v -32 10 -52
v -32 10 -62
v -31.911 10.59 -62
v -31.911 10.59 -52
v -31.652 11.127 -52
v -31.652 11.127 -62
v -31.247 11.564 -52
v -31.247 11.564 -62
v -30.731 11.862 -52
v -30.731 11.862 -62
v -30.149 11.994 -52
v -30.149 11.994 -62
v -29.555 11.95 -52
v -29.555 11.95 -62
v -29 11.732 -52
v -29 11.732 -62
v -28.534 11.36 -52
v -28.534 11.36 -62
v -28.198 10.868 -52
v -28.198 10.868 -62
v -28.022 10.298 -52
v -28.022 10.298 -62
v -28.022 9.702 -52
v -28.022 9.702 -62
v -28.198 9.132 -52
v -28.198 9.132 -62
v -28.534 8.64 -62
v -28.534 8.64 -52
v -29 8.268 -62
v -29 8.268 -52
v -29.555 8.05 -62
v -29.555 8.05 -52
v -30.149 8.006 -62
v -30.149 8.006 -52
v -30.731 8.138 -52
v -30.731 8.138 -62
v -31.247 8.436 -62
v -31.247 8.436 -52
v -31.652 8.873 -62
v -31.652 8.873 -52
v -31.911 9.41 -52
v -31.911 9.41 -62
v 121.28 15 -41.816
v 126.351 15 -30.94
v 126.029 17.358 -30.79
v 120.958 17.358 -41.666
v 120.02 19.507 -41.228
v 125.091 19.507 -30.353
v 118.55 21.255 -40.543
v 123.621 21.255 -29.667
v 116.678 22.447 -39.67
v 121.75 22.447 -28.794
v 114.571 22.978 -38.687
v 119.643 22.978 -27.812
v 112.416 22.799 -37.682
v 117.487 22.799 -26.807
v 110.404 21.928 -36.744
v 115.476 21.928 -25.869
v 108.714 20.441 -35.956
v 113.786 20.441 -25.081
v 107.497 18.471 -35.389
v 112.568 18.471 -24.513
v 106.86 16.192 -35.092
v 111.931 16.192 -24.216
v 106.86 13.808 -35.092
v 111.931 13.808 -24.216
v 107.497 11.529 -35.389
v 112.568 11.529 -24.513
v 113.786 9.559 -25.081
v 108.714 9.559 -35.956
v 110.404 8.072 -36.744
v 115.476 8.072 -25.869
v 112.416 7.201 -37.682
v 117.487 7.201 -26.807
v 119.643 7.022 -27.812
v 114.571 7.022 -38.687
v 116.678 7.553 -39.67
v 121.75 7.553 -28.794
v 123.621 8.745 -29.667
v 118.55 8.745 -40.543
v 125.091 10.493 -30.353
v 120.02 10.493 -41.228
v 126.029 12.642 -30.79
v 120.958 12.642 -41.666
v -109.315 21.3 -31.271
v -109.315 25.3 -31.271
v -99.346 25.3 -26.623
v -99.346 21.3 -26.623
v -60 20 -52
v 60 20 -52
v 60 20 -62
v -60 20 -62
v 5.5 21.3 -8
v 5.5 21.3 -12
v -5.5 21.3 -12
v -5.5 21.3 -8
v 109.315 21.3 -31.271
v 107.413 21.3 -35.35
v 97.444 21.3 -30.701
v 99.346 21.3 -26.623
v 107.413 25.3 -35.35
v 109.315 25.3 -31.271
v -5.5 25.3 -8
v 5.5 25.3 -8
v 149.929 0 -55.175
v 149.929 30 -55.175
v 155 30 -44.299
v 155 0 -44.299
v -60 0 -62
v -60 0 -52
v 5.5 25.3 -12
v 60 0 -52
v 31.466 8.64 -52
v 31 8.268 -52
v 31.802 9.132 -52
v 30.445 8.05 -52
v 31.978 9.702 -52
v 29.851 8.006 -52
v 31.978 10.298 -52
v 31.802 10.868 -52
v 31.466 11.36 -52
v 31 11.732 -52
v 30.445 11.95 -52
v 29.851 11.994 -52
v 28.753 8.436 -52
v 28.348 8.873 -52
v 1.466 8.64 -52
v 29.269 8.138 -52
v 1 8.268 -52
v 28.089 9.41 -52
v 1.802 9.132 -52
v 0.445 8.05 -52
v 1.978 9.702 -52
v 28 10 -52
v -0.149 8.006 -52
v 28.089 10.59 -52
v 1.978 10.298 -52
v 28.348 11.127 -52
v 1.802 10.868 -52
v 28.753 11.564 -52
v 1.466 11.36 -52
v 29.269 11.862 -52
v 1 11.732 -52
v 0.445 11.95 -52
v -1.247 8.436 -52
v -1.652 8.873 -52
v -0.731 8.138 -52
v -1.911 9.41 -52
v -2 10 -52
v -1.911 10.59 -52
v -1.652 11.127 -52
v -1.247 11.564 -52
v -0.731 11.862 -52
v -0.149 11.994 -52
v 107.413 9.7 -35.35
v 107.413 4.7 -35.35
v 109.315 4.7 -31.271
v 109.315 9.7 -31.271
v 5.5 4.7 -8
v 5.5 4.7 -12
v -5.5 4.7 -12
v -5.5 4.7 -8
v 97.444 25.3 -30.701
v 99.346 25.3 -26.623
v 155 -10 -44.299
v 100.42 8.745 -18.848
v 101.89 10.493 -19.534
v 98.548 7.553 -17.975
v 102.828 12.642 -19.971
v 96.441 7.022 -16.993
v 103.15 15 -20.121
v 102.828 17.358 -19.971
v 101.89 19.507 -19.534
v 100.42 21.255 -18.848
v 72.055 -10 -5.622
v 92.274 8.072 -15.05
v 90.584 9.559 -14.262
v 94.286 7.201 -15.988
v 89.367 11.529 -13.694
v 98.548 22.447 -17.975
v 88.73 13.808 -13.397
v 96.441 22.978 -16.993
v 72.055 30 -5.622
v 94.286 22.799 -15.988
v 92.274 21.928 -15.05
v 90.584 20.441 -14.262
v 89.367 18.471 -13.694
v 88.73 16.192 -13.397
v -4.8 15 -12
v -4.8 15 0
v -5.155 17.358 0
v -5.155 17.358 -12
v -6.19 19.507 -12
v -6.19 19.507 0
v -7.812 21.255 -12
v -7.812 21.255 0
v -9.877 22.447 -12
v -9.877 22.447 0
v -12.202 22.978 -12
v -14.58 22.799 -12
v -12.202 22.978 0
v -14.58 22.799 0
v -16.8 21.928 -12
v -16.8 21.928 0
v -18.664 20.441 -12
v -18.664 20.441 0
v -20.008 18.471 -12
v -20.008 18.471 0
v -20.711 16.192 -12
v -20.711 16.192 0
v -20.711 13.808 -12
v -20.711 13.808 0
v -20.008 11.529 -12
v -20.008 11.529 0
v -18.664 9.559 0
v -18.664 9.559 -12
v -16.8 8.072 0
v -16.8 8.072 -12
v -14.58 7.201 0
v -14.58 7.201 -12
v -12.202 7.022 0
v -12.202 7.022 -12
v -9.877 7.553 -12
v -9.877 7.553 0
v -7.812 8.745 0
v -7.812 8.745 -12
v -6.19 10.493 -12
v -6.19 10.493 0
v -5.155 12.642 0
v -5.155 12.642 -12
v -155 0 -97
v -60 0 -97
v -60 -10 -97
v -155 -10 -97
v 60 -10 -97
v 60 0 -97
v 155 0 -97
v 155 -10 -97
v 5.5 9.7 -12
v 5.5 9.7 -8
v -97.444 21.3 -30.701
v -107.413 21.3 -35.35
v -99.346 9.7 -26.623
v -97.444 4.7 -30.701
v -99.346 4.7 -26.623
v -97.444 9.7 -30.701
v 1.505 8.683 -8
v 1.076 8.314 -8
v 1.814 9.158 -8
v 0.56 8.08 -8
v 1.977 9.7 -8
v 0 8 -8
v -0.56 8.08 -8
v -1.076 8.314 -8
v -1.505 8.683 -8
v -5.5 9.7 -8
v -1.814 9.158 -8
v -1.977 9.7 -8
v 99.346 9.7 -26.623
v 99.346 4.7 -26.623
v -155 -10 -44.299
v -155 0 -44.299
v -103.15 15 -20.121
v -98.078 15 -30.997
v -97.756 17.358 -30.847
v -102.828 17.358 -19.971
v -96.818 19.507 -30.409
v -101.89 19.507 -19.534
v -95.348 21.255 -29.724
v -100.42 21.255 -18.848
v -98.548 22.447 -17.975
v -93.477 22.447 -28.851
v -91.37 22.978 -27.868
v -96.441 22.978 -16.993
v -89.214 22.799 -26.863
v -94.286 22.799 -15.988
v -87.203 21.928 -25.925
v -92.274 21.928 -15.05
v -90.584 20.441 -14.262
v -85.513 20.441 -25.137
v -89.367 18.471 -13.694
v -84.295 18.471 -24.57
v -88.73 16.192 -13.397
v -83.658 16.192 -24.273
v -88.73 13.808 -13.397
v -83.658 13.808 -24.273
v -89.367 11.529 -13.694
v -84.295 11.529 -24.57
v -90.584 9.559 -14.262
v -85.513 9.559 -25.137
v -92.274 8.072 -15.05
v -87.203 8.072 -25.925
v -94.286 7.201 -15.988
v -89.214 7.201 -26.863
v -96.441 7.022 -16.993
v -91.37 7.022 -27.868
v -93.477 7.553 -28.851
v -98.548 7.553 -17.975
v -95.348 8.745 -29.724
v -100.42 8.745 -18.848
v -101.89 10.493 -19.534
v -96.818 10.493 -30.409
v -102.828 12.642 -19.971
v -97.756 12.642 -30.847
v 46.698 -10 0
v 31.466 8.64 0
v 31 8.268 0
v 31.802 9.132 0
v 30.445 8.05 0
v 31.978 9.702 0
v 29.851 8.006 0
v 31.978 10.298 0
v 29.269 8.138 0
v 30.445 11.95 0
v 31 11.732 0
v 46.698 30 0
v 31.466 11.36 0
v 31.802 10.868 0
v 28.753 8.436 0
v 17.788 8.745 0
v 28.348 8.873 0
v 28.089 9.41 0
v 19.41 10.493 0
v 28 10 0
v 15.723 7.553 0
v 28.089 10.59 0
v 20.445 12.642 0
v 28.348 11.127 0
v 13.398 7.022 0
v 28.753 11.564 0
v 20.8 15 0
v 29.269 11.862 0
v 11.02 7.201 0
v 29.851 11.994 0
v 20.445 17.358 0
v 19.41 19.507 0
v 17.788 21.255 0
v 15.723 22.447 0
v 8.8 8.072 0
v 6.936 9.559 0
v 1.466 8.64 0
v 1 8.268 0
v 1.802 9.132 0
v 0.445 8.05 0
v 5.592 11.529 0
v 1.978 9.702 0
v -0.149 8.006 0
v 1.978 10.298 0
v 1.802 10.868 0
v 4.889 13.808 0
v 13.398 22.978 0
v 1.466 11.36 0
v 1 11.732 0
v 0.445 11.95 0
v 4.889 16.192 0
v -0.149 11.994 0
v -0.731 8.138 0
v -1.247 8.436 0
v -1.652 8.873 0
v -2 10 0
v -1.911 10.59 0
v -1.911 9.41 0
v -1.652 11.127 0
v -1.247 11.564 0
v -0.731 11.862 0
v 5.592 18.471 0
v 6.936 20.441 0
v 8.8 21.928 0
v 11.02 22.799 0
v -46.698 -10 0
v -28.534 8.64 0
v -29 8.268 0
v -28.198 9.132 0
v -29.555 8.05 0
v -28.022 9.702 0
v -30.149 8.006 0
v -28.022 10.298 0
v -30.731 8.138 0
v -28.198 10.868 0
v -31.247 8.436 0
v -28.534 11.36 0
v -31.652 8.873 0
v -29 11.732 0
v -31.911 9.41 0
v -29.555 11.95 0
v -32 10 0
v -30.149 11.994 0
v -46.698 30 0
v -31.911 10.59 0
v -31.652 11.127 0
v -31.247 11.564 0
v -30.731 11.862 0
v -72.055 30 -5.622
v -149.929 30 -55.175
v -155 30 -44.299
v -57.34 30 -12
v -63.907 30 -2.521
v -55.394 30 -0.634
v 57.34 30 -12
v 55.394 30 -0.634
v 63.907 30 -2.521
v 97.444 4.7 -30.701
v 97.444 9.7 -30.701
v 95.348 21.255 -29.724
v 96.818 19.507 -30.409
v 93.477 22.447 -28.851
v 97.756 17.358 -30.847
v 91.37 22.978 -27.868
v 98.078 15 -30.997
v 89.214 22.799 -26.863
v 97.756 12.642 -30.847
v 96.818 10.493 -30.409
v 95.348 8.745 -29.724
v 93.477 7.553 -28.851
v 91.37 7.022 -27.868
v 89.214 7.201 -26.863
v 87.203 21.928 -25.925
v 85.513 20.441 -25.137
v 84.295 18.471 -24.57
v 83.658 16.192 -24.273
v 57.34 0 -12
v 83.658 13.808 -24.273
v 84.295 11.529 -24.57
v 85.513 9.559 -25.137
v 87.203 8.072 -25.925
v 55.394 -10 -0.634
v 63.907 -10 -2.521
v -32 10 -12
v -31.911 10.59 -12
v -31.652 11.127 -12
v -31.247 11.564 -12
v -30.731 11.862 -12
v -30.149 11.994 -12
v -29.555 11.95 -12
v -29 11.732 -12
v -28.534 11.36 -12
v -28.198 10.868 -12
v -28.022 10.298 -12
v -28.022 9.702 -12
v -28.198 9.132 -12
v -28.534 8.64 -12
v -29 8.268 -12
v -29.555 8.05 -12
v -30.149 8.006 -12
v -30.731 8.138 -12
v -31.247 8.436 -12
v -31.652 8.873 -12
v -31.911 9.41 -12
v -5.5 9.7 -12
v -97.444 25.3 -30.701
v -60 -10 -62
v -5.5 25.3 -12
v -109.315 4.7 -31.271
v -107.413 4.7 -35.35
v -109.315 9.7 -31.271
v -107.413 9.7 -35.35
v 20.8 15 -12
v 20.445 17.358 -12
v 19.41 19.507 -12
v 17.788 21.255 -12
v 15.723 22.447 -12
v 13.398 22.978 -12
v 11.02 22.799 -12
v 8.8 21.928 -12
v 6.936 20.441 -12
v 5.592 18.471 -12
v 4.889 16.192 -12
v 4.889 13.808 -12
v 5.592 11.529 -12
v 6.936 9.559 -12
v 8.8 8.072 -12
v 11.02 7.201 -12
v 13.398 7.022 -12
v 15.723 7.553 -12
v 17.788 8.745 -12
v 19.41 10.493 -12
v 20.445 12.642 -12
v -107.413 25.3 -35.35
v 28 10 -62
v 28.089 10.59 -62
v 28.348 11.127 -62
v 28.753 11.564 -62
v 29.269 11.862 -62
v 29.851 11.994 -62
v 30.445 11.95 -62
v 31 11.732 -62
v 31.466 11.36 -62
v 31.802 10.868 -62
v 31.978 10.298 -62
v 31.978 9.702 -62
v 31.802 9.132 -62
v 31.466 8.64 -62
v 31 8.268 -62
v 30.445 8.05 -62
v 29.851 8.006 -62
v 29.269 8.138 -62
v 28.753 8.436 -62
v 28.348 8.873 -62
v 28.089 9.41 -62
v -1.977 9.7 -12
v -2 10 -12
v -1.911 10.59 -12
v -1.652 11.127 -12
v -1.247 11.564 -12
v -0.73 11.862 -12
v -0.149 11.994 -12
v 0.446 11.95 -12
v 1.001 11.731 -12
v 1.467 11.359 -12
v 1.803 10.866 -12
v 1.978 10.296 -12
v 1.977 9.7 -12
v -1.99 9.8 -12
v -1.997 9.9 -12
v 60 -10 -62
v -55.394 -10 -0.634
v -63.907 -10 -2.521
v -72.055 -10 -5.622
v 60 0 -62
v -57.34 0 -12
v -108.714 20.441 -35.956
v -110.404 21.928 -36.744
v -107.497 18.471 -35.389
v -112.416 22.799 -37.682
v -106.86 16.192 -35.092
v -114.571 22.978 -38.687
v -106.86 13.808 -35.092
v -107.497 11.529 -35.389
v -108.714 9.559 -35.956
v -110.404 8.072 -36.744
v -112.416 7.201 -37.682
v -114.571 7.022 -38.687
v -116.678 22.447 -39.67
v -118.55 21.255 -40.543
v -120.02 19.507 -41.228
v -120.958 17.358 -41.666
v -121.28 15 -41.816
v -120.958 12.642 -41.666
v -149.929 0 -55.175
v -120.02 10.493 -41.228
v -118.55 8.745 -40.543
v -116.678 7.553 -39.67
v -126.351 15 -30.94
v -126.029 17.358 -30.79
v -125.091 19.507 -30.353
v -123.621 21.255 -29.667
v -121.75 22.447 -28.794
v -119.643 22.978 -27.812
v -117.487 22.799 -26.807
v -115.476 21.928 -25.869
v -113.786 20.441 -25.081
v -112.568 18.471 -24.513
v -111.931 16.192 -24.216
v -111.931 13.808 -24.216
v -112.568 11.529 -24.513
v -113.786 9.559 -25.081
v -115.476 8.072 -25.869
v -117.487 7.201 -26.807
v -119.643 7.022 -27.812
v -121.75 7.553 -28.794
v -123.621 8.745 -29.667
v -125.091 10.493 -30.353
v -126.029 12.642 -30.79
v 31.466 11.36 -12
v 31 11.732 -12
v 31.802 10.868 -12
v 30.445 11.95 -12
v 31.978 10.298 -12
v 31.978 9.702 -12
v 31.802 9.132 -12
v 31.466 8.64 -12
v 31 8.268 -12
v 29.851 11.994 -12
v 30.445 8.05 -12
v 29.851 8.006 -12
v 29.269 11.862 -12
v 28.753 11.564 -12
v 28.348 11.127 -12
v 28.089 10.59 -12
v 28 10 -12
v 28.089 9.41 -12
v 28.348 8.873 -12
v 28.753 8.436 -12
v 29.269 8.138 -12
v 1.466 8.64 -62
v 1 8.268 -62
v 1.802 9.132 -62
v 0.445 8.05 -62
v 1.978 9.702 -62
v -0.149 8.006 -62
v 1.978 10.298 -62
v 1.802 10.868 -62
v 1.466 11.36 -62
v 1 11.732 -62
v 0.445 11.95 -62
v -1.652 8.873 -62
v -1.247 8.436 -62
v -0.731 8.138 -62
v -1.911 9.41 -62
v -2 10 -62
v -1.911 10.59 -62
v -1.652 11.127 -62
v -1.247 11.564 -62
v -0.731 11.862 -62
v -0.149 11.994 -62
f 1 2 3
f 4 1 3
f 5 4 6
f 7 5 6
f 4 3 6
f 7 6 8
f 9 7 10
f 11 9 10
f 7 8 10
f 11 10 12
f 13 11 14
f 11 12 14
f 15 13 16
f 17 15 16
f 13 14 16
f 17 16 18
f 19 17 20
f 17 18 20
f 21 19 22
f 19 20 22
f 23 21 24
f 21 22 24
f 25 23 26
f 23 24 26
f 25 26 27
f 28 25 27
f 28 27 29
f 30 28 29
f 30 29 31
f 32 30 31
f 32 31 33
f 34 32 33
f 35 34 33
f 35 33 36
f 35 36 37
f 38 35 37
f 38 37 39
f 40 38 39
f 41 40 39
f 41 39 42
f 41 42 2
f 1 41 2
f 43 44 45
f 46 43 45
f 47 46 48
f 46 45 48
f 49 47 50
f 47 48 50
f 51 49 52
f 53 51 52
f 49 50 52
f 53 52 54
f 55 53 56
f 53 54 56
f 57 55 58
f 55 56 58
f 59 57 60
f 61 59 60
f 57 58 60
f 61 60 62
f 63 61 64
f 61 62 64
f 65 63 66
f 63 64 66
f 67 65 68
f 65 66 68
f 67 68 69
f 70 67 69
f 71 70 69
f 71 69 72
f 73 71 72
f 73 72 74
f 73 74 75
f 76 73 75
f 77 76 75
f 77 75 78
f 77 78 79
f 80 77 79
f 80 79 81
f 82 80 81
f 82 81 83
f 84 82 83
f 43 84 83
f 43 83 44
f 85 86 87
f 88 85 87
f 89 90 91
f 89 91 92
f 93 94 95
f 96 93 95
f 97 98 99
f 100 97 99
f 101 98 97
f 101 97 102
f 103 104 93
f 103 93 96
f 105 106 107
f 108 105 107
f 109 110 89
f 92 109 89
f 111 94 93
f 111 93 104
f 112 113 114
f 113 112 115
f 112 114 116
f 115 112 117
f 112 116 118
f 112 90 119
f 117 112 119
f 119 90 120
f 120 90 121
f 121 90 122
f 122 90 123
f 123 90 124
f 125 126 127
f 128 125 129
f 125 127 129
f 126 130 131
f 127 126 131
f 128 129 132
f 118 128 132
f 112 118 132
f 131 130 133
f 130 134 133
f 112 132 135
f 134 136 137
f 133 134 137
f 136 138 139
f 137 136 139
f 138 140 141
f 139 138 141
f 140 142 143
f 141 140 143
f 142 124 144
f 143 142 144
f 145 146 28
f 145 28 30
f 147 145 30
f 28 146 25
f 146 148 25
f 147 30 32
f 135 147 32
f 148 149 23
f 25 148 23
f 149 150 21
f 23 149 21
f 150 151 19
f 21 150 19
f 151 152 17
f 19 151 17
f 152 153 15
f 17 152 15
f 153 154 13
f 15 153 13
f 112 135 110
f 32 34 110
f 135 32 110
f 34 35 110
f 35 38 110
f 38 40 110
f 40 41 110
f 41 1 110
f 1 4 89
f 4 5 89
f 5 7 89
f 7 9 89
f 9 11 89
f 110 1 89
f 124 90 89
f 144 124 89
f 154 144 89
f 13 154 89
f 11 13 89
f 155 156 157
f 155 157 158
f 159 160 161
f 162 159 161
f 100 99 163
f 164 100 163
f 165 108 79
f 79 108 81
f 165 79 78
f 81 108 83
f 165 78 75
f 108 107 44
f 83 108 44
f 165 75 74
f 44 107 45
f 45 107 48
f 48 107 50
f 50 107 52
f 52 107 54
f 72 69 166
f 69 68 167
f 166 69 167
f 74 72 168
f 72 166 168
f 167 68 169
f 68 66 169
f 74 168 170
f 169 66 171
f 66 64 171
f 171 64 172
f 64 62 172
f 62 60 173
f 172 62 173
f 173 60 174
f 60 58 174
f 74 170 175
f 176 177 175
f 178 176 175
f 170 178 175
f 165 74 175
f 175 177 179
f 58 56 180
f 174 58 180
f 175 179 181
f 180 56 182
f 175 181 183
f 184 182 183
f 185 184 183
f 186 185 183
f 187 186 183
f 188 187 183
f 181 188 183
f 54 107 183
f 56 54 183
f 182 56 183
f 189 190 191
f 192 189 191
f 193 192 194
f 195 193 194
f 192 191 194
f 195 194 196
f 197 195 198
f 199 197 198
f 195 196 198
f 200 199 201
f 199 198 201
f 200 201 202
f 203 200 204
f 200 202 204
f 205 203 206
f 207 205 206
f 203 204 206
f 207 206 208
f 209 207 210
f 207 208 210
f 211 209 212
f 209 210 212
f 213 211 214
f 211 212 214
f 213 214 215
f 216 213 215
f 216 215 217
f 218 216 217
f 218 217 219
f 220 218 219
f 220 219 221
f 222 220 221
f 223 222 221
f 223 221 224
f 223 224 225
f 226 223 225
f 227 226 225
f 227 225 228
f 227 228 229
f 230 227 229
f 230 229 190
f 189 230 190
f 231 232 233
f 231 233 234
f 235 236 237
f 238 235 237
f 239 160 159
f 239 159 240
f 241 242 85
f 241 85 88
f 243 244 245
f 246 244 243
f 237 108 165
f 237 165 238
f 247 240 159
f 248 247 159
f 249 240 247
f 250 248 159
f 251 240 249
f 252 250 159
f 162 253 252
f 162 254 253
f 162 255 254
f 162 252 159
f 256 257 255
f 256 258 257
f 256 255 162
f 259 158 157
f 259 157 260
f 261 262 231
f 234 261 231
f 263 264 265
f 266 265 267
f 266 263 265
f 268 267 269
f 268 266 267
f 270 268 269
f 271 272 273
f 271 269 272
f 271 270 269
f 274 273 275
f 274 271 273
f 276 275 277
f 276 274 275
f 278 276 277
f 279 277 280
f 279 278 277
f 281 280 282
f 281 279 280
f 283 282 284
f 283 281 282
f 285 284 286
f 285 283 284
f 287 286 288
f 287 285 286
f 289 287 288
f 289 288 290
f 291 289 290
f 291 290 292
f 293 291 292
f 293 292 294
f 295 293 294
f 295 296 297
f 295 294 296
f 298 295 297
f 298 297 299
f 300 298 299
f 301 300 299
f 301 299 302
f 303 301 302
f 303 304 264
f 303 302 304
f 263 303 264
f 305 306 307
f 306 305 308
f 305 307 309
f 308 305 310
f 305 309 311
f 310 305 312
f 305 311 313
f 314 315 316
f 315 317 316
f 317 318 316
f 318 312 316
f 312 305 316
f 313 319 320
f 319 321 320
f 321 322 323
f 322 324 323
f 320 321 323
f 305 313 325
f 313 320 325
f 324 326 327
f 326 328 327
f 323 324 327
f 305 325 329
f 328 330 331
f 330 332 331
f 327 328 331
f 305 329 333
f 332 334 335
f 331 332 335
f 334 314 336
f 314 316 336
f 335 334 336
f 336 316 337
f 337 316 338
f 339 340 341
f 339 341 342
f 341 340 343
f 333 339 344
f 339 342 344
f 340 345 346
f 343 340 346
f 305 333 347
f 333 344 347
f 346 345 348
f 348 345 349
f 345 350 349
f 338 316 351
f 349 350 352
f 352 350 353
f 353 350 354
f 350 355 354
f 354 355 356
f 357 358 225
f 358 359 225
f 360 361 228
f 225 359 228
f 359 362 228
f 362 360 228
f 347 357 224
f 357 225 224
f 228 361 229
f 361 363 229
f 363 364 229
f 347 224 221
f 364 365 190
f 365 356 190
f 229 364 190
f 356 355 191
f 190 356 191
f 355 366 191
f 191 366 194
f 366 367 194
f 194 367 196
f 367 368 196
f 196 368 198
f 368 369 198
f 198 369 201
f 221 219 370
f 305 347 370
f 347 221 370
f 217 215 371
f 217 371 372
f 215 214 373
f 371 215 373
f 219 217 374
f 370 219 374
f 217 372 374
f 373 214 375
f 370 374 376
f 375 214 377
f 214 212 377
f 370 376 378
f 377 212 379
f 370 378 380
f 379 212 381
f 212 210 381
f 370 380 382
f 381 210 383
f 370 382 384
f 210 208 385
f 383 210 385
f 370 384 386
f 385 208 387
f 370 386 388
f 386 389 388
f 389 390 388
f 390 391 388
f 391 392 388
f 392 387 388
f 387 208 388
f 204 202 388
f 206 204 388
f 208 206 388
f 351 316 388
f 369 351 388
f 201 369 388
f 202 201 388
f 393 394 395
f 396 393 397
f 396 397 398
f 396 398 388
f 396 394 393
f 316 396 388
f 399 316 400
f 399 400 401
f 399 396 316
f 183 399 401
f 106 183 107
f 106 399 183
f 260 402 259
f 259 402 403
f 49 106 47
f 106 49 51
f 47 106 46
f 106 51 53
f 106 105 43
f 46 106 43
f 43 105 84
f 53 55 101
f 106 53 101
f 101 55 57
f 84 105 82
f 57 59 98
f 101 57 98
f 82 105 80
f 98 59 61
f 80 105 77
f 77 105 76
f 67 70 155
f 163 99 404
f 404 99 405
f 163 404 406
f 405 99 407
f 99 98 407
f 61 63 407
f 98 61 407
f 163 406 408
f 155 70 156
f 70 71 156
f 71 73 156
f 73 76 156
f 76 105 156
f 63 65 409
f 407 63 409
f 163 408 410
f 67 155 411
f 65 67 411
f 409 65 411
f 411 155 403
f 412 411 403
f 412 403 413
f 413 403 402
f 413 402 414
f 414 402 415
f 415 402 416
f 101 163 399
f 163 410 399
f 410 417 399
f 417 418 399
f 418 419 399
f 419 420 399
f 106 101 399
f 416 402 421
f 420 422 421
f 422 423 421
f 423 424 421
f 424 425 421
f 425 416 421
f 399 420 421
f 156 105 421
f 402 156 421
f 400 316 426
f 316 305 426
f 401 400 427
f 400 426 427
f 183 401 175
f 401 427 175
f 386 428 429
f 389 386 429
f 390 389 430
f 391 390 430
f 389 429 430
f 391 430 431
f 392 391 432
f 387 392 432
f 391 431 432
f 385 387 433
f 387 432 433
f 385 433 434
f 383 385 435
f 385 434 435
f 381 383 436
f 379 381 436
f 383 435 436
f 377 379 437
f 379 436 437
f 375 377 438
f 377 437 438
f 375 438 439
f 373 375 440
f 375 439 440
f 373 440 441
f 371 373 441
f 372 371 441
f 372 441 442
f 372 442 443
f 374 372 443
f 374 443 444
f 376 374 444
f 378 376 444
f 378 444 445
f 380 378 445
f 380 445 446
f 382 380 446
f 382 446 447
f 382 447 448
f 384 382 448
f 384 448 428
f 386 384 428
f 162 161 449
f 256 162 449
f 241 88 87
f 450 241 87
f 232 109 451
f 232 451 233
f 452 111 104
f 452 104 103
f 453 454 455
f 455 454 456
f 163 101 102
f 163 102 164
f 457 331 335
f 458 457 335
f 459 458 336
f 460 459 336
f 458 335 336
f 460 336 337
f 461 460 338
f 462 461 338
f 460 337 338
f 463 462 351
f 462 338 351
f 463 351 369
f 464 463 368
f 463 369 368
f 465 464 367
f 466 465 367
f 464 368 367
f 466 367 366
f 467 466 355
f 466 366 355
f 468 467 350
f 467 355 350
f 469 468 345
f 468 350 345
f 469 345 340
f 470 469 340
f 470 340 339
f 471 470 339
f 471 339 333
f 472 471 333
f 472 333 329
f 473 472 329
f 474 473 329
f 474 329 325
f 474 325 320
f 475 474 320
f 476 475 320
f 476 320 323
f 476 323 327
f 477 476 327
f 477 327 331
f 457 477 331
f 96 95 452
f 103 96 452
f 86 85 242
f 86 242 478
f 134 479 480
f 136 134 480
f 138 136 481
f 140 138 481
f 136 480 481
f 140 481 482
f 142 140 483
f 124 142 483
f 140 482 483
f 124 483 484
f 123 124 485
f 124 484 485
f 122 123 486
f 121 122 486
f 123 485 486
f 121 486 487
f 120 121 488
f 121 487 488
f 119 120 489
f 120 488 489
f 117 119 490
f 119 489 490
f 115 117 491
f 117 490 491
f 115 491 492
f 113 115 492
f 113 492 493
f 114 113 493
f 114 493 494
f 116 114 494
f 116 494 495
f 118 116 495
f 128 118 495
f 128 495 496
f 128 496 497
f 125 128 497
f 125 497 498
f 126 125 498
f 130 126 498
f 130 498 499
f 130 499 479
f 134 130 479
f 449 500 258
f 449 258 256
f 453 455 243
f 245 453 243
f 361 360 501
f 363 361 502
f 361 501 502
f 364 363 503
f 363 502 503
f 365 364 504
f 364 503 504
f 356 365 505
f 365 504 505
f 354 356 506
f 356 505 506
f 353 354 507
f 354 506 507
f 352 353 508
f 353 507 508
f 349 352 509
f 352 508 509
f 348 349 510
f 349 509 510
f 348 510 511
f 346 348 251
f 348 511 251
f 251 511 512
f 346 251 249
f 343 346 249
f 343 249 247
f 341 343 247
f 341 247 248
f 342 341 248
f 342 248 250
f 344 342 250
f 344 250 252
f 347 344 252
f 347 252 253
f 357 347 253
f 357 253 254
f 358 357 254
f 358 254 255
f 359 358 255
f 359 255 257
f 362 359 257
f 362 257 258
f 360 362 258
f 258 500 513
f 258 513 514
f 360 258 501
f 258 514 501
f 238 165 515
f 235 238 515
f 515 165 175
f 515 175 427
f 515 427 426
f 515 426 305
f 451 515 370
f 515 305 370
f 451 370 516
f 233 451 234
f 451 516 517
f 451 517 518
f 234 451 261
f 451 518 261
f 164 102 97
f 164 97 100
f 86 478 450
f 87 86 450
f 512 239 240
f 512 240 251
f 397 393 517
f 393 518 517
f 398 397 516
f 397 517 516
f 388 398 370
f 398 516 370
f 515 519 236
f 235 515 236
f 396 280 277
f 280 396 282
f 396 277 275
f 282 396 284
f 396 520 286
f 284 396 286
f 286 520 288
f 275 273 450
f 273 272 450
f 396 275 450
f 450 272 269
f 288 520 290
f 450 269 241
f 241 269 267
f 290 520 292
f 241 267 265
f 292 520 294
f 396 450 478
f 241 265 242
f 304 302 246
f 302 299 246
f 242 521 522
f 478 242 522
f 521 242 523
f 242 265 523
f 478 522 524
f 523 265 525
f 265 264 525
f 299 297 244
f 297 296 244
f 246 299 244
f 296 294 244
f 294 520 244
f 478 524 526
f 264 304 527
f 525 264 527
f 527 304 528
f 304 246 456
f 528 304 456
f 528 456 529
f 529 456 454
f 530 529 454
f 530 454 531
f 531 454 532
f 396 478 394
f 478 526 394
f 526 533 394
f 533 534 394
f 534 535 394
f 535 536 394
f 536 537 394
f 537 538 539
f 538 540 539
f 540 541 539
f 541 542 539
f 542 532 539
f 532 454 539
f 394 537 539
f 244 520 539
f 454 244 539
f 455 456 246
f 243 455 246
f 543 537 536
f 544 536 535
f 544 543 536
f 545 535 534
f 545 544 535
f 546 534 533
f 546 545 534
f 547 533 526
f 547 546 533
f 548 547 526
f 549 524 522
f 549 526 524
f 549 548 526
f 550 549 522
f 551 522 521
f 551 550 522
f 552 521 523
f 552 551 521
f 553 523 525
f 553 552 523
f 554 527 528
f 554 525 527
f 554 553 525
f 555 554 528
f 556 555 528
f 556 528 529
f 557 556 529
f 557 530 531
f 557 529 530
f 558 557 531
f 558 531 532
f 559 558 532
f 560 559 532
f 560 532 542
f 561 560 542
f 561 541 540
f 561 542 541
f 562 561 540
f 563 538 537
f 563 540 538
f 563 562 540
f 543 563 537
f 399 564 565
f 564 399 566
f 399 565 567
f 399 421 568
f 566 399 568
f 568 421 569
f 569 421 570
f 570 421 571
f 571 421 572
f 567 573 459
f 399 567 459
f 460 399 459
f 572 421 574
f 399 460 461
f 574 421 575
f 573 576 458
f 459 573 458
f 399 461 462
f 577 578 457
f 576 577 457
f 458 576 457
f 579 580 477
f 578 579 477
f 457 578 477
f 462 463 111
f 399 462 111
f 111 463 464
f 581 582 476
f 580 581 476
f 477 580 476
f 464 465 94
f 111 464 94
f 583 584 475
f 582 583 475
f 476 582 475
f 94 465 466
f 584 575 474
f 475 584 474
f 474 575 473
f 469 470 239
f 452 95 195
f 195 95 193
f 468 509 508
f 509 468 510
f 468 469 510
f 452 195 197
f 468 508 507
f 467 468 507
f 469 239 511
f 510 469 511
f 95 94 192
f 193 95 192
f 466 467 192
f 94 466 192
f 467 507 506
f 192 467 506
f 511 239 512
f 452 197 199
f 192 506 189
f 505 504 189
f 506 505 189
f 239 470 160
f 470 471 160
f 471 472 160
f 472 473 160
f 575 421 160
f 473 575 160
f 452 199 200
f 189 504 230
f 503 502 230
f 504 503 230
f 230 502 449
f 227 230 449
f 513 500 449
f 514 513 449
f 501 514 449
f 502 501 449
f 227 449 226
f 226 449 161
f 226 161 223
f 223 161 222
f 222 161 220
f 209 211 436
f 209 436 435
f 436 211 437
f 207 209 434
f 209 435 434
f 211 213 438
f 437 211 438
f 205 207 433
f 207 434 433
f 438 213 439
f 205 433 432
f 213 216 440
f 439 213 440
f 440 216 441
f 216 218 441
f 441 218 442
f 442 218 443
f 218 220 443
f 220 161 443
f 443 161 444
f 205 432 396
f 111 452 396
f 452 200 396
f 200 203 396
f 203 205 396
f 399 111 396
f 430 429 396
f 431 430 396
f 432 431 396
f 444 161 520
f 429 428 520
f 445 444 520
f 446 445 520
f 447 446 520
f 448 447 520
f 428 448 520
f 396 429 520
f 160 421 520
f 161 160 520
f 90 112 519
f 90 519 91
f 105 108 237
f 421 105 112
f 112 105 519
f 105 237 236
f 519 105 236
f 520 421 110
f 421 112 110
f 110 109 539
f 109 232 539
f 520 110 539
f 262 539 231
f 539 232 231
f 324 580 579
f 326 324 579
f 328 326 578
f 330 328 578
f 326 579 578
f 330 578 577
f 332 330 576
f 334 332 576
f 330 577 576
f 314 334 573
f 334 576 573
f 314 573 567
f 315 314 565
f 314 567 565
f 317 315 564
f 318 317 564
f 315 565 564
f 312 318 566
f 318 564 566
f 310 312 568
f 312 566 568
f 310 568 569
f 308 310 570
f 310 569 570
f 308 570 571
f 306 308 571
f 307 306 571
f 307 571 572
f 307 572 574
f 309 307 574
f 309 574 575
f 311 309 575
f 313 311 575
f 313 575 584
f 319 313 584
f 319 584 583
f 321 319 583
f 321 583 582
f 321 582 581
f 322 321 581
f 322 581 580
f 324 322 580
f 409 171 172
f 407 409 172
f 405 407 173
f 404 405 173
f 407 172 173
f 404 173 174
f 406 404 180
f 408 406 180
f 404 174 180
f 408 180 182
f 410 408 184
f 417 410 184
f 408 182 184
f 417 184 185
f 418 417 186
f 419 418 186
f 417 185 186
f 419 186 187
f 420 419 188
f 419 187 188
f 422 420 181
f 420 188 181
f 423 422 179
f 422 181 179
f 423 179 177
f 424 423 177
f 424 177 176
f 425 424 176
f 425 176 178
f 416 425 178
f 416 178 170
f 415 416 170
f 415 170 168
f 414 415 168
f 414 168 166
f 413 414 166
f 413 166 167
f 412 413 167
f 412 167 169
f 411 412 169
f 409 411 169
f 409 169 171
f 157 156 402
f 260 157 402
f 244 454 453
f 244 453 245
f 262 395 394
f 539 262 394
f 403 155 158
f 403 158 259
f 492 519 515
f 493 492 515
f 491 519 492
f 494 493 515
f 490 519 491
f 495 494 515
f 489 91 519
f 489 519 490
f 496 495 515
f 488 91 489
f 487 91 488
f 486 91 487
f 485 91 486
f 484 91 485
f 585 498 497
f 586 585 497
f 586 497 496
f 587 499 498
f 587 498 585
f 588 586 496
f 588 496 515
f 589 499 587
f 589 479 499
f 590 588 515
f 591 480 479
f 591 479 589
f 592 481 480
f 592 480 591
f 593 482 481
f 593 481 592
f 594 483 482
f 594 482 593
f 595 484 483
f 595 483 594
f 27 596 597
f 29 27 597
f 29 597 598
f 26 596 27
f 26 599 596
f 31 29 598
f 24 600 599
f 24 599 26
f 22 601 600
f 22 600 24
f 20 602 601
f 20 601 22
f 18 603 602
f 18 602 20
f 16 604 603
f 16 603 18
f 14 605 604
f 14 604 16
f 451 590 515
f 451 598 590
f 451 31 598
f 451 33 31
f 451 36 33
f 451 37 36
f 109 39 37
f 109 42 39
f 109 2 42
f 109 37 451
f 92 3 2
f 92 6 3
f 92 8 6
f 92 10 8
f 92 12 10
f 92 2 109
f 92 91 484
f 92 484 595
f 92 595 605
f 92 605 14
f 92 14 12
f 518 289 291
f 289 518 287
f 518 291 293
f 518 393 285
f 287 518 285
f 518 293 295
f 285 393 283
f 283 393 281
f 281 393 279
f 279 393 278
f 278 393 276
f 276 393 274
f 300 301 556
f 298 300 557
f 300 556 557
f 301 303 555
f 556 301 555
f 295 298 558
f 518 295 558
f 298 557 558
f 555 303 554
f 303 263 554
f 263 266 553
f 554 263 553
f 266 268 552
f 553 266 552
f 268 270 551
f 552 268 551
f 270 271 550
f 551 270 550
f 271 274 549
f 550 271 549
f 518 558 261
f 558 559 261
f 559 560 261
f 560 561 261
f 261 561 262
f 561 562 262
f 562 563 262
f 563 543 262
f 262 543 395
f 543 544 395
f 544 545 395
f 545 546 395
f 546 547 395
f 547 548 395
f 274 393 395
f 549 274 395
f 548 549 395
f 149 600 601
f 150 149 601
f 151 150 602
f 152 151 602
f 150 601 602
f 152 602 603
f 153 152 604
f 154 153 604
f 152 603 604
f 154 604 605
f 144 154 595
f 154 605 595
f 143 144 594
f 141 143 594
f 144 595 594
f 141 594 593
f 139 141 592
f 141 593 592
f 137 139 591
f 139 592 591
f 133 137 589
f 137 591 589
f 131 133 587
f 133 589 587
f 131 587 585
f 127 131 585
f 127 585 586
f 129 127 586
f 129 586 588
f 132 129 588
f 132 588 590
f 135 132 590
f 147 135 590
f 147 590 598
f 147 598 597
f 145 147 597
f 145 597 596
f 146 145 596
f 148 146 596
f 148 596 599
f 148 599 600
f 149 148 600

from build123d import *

# Parameters (mm, degrees)
EXTRUDE_THIN1_DEPTH = 30
SKETCH2_R           = 8
CUT_EXTRUDE1_DEPTH  = 141.868386798
SKETCH3_R           = 8
CUT_EXTRUDE2_DEPTH  = 56.174920969
BOSS_EXTRUDE1_DEPTH = 10
SKETCH7_W           = 120
SKETCH7_H           = 30
BOSS_EXTRUDE2_DEPTH = 10
SKETCH8_R           = 2
CUT_EXTRUDE3_DEPTH  = 63
FILLET1_R           = 60
SKETCH9_W           = 95
SKETCH9_H           = 52.700772475
BOSS_EXTRUDE3_DEPTH = 10
SKETCH10_W          = 11
SKETCH10_H          = 4
SKETCH10_H_2        = 5
CUT_EXTRUDE4_DEPTH  = 4.5
SKETCH13_W          = 11
SKETCH13_H          = 5
SKETCH13_H_2        = 4
CUT_EXTRUDE5_DEPTH  = 4


with BuildPart() as part:
    # Sketch1 → Extrude-Thin1 (new body)
    with BuildSketch(Plane(origin=(0, 0, 0), x_dir=(1, 0, 0), z_dir=(0, 1, 0))):
        Polygon((-155, 44.299227525), (-60, 0), (60, 0), (155, 44.299227525), (149.928580859, 55.174920969), (57.339664048, 12), (-57.339664048, 12), (-149.928580859, 55.174920969), align=None)
    extrude(amount=EXTRUDE_THIN1_DEPTH)

    # Sketch2 → Cut-Extrude1 (cut, through all)
    with BuildSketch(Plane(origin=(10.716371709, 0, 22.981333294), x_dir=(0.906307787, 0, -0.422618262), z_dir=(0.422618262, 0, 0.906307787))):
        with Locations((93.988918373, 15)):
            Circle(SKETCH2_R)
        with Locations((119.588918373, 15)):
            Circle(SKETCH2_R)
    cut_extrude1 = extrude(amount=-CUT_EXTRUDE1_DEPTH, mode=Mode.SUBTRACT)

    # Mirror1: Cut-Extrude1 across plane
    add(cut_extrude1.mirror(Plane(origin=(0, 0, 0), x_dir=(0, 0, 1), z_dir=(1, 0, 0))), mode=Mode.SUBTRACT)

    # Sketch3 → Cut-Extrude2 (cut, through all)
    with BuildSketch(Plane.XY):
        with Locations((12.8, 15)):
            Circle(SKETCH3_R)
        with Locations((-12.8, 15)):
            Circle(SKETCH3_R)
    extrude(amount=-CUT_EXTRUDE2_DEPTH, mode=Mode.SUBTRACT)

    # Sketch5 → Boss-Extrude1 (add)
    with BuildSketch(Plane.XZ):
        Polygon((66.80863999, -55.174920969), (149.928580859, -55.174920969), (57.339664048, -12), (-57.339664048, -12), (-149.928580859, -55.174920969), (-66.80863999, -55.174920969), (-60, -52), (60, -52), align=None)
        Polygon((-155, -44.299227525), (-149.928580859, -55.174920969), (-57.339664048, -12), (57.339664048, -12), (149.928580859, -55.174920969), (155, -44.299227525), (60, 0), (-60, 0), align=None)
    extrude(amount=BOSS_EXTRUDE1_DEPTH)

    # Sketch7 → Boss-Extrude2 (add)
    with BuildSketch(Plane(origin=(0, 0, -52), x_dir=(-1, 0, 0), z_dir=(0, 0, -1))):
        with Locations((0, 5)):
            Rectangle(SKETCH7_W, SKETCH7_H)
    extrude(amount=BOSS_EXTRUDE2_DEPTH)

    # Sketch8 → Cut-Extrude3 (cut, through all)
    with BuildSketch(Plane(origin=(0, 0, -62), x_dir=(-1, 0, 0), z_dir=(0, 0, -1))):
        with Locations((0, 10)):
            Circle(SKETCH8_R)
        with Locations((-30, 10)):
            Circle(SKETCH8_R)
        with Locations((30, 10)):
            Circle(SKETCH8_R)
    extrude(amount=-CUT_EXTRUDE3_DEPTH, mode=Mode.SUBTRACT)

    # Fillet1
    fillet1_edges = [part.edges().sort_by_distance(p)[0] for p in [
        (60, 10, 0),
        (-60, 10, 0),
    ]]
    fillet(fillet1_edges, radius=FILLET1_R)

    # Sketch9 → Boss-Extrude3 (add)
    with BuildSketch(Plane(origin=(0, 0, 0), x_dir=(1, 0, 0), z_dir=(0, 1, 0))):
        with Locations((107.5, 70.649613762)):
            Rectangle(SKETCH9_W, SKETCH9_H)
    boss_extrude3 = extrude(amount=-BOSS_EXTRUDE3_DEPTH)

    # Mirror2: Boss-Extrude3 across plane
    add(boss_extrude3.mirror(Plane(origin=(0, 0, 0), x_dir=(0, 0, 1), z_dir=(1, 0, 0))))

    # Sketch10 → Cut-Extrude4 (cut)
    with BuildSketch(Plane(origin=(5.644952569, 0, 12.105639849), x_dir=(-0.906307787, 0, 0.422618262), z_dir=(-0.422618262, 0, -0.906307787))):
        with Locations((-106.788918373, 23.3)):
            Rectangle(SKETCH10_W, SKETCH10_H)
        with Locations((-106.788918373, 7.2)):
            Rectangle(SKETCH10_W, SKETCH10_H_2)
    cut_extrude4 = extrude(amount=-CUT_EXTRUDE4_DEPTH, mode=Mode.SUBTRACT)

    # Mirror3: Cut-Extrude4 across plane
    add(cut_extrude4.mirror(Plane(origin=(0, 0, 0), x_dir=(0, 0, 1), z_dir=(1, 0, 0))), mode=Mode.SUBTRACT)

    # Sketch13 → Cut-Extrude5 (cut)
    with BuildSketch(Plane(origin=(0, 0, -12), x_dir=(-1, 0, 0), z_dir=(0, 0, -1))):
        with Locations((0, 7.2)):
            Rectangle(SKETCH13_W, SKETCH13_H)
        with Locations((0, 23.3)):
            Rectangle(SKETCH13_W, SKETCH13_H_2)
    extrude(amount=-CUT_EXTRUDE5_DEPTH, mode=Mode.SUBTRACT)


solid = part.part
